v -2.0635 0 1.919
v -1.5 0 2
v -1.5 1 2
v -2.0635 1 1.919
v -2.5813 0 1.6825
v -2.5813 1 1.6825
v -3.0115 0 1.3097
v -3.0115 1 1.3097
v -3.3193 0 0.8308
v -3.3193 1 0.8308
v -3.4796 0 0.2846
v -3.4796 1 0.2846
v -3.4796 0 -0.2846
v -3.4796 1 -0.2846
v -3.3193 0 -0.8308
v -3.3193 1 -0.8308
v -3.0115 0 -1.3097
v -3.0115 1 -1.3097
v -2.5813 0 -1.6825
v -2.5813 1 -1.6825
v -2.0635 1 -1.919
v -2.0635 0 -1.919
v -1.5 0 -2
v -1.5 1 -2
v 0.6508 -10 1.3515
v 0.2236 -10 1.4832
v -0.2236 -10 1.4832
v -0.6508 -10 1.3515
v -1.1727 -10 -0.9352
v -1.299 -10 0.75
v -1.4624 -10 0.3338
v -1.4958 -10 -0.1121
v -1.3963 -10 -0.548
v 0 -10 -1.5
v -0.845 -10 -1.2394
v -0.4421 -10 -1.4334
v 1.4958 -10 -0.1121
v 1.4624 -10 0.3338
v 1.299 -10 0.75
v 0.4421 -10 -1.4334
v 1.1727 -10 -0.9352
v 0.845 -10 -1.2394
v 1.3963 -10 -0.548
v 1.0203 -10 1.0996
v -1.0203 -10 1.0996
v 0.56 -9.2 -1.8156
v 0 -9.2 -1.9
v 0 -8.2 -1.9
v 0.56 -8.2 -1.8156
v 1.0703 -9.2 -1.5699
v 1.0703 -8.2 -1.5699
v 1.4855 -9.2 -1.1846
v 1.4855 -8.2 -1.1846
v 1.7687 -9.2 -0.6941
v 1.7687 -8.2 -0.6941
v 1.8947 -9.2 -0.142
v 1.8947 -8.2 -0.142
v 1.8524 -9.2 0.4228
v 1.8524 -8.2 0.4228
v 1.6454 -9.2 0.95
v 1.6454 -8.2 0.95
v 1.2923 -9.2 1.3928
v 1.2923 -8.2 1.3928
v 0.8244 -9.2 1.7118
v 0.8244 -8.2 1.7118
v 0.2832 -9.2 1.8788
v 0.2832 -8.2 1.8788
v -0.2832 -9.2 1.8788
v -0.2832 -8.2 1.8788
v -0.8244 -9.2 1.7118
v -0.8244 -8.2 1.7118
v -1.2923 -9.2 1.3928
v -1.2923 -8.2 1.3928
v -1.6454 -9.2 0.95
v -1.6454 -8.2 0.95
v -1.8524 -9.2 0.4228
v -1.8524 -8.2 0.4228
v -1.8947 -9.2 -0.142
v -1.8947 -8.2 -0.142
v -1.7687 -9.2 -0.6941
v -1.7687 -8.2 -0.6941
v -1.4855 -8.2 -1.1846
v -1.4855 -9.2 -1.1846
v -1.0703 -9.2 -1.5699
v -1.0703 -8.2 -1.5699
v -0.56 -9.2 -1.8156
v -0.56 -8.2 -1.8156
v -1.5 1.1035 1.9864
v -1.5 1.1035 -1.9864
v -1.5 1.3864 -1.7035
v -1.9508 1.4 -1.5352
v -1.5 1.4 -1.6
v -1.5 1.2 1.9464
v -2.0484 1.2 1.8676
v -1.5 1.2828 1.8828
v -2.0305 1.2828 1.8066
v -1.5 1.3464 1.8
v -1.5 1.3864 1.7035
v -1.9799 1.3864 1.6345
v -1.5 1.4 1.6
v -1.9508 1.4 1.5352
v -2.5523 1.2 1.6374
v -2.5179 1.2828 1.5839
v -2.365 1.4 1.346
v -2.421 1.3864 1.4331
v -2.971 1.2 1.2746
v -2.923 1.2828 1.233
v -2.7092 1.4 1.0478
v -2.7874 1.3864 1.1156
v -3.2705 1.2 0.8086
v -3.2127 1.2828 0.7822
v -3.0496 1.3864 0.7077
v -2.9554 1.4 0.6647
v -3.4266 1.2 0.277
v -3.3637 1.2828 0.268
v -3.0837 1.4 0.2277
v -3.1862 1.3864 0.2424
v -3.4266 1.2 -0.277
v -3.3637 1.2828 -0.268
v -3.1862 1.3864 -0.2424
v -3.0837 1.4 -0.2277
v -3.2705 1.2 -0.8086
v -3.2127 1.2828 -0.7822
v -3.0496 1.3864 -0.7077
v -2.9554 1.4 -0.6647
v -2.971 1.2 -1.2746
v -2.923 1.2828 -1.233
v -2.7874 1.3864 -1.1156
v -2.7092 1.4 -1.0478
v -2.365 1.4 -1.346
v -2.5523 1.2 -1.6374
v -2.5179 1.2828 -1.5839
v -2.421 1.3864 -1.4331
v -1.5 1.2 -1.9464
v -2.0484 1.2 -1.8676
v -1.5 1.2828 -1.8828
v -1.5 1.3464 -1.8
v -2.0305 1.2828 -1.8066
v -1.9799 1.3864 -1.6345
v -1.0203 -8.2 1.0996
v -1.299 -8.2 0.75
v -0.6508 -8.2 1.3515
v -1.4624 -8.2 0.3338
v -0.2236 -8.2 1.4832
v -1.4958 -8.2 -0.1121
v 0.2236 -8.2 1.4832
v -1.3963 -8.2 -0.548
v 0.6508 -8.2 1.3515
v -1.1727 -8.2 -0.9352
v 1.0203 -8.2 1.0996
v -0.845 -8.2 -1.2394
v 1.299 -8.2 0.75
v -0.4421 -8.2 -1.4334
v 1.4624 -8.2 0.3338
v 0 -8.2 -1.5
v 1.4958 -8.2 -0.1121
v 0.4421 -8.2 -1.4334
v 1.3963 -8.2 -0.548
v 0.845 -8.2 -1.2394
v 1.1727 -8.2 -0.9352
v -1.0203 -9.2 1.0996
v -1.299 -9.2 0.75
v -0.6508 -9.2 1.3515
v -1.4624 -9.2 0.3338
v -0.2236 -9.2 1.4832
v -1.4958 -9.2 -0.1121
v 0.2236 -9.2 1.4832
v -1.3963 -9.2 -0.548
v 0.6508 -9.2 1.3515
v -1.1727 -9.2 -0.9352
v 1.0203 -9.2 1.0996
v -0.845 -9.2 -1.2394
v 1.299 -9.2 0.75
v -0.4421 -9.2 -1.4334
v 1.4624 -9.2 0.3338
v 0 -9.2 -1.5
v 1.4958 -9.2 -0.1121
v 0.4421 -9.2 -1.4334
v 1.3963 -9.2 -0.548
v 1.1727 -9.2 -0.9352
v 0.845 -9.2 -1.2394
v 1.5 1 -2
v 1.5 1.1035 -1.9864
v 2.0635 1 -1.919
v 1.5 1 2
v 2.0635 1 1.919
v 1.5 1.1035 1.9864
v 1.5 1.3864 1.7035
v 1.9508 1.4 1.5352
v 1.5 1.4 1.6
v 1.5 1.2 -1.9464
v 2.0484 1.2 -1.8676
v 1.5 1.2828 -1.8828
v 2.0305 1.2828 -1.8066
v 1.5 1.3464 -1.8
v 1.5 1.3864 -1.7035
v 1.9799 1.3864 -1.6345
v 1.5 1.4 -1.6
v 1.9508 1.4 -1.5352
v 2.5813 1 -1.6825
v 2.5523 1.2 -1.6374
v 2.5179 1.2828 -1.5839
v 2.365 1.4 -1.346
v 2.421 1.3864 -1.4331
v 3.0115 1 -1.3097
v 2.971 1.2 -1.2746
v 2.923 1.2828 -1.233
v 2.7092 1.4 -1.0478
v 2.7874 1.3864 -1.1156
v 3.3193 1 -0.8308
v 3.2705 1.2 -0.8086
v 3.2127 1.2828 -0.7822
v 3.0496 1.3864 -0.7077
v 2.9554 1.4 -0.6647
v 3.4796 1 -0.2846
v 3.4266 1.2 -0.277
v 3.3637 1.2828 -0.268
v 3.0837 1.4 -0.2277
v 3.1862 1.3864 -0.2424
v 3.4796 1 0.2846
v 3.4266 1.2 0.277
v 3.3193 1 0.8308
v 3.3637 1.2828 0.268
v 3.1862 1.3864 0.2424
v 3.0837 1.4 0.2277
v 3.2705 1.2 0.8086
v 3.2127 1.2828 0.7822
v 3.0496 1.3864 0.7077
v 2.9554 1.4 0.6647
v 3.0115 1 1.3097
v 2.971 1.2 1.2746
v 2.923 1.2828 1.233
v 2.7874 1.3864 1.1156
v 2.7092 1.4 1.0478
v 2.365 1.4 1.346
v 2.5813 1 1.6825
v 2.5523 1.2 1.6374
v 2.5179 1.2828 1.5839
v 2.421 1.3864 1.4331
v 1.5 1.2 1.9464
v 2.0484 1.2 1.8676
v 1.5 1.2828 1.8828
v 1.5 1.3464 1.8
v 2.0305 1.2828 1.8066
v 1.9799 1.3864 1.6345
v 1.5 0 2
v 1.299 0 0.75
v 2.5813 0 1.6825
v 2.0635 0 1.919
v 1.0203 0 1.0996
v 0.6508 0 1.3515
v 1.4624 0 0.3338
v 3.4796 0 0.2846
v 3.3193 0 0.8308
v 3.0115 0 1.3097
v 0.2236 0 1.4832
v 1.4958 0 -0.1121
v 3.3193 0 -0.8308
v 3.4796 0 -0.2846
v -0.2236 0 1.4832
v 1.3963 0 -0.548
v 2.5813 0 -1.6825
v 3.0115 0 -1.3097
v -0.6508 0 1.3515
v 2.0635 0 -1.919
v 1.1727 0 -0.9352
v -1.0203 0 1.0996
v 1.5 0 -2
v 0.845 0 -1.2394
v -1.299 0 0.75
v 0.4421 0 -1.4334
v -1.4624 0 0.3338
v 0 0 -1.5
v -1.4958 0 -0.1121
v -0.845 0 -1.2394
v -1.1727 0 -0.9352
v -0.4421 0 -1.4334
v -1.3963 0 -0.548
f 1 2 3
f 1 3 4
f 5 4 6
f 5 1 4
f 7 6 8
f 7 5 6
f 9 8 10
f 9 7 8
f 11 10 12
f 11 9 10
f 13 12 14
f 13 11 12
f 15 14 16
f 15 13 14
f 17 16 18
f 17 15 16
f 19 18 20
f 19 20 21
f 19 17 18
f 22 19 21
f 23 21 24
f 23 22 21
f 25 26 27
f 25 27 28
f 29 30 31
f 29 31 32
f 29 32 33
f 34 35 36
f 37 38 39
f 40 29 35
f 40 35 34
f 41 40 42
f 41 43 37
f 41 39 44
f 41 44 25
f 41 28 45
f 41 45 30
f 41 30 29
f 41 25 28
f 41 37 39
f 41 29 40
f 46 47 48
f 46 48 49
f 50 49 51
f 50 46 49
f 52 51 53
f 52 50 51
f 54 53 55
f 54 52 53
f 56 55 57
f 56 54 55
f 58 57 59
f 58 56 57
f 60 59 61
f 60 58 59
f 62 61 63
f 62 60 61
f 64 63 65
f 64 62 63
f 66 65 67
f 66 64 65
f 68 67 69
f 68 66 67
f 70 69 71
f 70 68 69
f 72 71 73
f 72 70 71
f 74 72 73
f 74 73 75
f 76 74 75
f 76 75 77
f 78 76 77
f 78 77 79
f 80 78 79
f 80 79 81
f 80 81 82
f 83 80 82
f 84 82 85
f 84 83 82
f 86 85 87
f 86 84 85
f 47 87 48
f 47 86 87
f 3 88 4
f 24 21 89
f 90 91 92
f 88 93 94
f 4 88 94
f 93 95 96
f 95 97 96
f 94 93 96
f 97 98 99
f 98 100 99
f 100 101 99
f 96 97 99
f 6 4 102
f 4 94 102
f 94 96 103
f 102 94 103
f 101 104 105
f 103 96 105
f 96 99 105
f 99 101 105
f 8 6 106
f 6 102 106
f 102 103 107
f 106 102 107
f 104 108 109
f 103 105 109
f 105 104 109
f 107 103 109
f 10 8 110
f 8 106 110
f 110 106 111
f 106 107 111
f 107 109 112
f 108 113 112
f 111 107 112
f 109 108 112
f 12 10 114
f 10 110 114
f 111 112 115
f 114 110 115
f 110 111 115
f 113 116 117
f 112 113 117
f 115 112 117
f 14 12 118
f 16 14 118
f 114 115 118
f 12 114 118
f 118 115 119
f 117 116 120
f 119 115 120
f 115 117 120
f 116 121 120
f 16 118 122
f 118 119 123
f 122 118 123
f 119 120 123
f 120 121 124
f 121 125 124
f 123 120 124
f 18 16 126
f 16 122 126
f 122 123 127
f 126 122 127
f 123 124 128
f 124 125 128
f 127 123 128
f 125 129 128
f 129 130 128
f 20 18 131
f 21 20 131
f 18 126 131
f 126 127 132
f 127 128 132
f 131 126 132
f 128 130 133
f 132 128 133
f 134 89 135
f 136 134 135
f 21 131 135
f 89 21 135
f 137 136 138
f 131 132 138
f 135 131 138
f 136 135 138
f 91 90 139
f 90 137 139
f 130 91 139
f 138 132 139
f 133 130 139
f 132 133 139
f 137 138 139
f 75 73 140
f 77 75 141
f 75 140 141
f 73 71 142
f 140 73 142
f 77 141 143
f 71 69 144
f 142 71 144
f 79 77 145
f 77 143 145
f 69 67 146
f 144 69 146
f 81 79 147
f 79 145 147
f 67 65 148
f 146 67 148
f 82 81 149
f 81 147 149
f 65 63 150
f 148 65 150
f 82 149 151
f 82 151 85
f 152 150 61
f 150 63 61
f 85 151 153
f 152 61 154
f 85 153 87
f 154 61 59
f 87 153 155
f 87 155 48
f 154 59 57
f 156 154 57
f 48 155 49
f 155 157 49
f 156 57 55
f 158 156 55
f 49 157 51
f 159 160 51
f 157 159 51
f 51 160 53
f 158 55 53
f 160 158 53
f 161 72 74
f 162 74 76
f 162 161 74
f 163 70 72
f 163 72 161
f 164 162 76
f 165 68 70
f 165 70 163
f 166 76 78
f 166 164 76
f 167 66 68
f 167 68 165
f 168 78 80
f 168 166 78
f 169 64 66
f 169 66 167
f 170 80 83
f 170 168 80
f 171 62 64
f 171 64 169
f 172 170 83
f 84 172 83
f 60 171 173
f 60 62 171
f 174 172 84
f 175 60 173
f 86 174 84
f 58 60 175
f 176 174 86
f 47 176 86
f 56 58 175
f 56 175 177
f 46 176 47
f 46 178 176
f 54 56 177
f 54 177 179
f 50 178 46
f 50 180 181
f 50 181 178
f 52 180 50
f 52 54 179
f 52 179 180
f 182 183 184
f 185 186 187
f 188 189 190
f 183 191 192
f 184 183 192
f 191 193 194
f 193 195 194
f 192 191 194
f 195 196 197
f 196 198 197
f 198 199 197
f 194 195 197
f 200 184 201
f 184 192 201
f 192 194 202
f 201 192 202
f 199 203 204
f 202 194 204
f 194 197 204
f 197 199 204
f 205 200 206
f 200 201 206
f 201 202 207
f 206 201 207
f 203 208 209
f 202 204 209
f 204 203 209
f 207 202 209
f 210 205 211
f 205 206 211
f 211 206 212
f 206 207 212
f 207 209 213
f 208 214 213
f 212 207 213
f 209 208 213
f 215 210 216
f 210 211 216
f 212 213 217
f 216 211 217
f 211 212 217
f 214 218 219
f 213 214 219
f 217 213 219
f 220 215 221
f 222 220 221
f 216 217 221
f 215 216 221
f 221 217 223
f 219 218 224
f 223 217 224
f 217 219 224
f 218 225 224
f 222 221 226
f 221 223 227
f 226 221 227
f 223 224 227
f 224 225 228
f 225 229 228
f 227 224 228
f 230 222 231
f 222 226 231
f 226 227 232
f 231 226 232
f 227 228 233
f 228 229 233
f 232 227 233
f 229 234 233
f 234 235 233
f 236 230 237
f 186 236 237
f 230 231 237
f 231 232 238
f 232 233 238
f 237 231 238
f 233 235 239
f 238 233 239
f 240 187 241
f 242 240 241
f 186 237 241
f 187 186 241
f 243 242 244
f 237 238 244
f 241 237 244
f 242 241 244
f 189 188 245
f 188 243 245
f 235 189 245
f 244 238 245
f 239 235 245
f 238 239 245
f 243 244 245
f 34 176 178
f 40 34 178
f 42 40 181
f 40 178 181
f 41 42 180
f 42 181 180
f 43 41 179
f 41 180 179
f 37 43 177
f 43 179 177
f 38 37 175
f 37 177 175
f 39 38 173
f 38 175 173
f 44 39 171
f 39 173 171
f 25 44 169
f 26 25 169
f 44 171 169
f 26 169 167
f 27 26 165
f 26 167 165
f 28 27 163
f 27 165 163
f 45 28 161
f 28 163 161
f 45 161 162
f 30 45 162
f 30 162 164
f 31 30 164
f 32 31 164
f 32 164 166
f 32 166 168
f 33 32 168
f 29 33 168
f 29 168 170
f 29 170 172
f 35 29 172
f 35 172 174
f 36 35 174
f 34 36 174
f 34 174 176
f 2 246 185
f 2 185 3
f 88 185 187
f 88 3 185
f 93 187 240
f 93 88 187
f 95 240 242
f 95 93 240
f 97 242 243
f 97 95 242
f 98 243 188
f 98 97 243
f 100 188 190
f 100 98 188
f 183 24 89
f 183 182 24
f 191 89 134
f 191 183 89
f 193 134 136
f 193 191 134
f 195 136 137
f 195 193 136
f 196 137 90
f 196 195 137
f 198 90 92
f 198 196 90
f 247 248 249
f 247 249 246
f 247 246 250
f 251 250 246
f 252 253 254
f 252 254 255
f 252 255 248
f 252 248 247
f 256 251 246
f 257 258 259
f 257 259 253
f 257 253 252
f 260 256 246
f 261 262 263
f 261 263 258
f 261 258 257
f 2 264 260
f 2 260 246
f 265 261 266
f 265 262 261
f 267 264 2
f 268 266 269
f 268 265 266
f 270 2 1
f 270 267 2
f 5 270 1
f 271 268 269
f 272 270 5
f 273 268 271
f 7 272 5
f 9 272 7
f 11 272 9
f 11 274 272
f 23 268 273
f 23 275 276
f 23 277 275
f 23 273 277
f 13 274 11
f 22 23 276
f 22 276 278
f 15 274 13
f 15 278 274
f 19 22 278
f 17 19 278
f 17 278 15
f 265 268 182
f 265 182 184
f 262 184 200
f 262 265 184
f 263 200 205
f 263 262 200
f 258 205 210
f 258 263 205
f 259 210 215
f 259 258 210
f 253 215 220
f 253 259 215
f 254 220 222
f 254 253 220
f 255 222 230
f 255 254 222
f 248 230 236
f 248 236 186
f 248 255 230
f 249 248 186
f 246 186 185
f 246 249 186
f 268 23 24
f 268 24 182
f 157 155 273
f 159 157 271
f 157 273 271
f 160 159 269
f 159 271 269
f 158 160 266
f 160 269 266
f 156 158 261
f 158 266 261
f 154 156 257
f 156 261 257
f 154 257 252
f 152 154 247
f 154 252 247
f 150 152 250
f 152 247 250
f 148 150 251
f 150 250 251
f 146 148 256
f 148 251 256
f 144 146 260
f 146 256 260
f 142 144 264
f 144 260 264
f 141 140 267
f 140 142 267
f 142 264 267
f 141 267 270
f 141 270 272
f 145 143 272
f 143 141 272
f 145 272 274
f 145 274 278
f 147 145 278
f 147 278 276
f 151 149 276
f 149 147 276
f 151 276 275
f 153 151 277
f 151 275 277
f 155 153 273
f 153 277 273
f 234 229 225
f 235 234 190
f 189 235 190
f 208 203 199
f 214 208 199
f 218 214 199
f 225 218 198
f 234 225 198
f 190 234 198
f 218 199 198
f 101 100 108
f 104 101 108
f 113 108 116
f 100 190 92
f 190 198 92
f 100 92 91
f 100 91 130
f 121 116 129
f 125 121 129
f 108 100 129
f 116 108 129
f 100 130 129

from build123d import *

# Parameters (mm, degrees)
BOSS_EXTRUDE1_DEPTH = 1.4
SKETCH2_R           = 1.5
BOSS_EXTRUDE2_DEPTH = 10
SKETCH3_R           = 1.9
BOSS_EXTRUDE3_DEPTH = 1
FILLET1_R           = 0.4


with BuildPart() as part:
    # Sketch1 → Boss-Extrude1 (new body)
    with BuildSketch(Plane(origin=(0, 0, 0), x_dir=(1, 0, 0), z_dir=(0, 1, 0))):
        with BuildLine():
            Line((-1.5, 2), (1.5, 2))
            ThreePointArc((1.5, 2), (3.5, 0), (1.5, -2))
            Line((1.5, -2), (-1.5, -2))
            ThreePointArc((-1.5, -2), (-3.5, 0), (-1.5, 2))
        make_face()
    extrude(amount=BOSS_EXTRUDE1_DEPTH)

    # Sketch2 → Boss-Extrude2 (add)
    with BuildSketch(Plane(origin=(0, 0, 0), x_dir=(-1, 0, 0), z_dir=(0, -1, 0))):
        with Locations(Location((0, 0, 0), (0, 0, 90))):
            Circle(SKETCH2_R)
    extrude(amount=BOSS_EXTRUDE2_DEPTH)

    # Sketch3 → Boss-Extrude3 (add)
    with BuildSketch(Plane(origin=(0, -9.2, 0), x_dir=(-1, 0, 0), z_dir=(0, -1, 0))):
        with Locations(Location((0, 0, 0), (0, 0, 90))):
            Circle(SKETCH3_R)
    extrude(amount=-BOSS_EXTRUDE3_DEPTH)

    # Fillet1
    fillet1_edges = [part.edges().sort_by_distance(p)[0] for p in [
        (3.5, 1.4, 0),
        (0, 1.4, -2),
        (-3.5, 1.4, 0),
        (0, 1.4, 2),
    ]]
    fillet(fillet1_edges, radius=FILLET1_R)


solid = part.part
